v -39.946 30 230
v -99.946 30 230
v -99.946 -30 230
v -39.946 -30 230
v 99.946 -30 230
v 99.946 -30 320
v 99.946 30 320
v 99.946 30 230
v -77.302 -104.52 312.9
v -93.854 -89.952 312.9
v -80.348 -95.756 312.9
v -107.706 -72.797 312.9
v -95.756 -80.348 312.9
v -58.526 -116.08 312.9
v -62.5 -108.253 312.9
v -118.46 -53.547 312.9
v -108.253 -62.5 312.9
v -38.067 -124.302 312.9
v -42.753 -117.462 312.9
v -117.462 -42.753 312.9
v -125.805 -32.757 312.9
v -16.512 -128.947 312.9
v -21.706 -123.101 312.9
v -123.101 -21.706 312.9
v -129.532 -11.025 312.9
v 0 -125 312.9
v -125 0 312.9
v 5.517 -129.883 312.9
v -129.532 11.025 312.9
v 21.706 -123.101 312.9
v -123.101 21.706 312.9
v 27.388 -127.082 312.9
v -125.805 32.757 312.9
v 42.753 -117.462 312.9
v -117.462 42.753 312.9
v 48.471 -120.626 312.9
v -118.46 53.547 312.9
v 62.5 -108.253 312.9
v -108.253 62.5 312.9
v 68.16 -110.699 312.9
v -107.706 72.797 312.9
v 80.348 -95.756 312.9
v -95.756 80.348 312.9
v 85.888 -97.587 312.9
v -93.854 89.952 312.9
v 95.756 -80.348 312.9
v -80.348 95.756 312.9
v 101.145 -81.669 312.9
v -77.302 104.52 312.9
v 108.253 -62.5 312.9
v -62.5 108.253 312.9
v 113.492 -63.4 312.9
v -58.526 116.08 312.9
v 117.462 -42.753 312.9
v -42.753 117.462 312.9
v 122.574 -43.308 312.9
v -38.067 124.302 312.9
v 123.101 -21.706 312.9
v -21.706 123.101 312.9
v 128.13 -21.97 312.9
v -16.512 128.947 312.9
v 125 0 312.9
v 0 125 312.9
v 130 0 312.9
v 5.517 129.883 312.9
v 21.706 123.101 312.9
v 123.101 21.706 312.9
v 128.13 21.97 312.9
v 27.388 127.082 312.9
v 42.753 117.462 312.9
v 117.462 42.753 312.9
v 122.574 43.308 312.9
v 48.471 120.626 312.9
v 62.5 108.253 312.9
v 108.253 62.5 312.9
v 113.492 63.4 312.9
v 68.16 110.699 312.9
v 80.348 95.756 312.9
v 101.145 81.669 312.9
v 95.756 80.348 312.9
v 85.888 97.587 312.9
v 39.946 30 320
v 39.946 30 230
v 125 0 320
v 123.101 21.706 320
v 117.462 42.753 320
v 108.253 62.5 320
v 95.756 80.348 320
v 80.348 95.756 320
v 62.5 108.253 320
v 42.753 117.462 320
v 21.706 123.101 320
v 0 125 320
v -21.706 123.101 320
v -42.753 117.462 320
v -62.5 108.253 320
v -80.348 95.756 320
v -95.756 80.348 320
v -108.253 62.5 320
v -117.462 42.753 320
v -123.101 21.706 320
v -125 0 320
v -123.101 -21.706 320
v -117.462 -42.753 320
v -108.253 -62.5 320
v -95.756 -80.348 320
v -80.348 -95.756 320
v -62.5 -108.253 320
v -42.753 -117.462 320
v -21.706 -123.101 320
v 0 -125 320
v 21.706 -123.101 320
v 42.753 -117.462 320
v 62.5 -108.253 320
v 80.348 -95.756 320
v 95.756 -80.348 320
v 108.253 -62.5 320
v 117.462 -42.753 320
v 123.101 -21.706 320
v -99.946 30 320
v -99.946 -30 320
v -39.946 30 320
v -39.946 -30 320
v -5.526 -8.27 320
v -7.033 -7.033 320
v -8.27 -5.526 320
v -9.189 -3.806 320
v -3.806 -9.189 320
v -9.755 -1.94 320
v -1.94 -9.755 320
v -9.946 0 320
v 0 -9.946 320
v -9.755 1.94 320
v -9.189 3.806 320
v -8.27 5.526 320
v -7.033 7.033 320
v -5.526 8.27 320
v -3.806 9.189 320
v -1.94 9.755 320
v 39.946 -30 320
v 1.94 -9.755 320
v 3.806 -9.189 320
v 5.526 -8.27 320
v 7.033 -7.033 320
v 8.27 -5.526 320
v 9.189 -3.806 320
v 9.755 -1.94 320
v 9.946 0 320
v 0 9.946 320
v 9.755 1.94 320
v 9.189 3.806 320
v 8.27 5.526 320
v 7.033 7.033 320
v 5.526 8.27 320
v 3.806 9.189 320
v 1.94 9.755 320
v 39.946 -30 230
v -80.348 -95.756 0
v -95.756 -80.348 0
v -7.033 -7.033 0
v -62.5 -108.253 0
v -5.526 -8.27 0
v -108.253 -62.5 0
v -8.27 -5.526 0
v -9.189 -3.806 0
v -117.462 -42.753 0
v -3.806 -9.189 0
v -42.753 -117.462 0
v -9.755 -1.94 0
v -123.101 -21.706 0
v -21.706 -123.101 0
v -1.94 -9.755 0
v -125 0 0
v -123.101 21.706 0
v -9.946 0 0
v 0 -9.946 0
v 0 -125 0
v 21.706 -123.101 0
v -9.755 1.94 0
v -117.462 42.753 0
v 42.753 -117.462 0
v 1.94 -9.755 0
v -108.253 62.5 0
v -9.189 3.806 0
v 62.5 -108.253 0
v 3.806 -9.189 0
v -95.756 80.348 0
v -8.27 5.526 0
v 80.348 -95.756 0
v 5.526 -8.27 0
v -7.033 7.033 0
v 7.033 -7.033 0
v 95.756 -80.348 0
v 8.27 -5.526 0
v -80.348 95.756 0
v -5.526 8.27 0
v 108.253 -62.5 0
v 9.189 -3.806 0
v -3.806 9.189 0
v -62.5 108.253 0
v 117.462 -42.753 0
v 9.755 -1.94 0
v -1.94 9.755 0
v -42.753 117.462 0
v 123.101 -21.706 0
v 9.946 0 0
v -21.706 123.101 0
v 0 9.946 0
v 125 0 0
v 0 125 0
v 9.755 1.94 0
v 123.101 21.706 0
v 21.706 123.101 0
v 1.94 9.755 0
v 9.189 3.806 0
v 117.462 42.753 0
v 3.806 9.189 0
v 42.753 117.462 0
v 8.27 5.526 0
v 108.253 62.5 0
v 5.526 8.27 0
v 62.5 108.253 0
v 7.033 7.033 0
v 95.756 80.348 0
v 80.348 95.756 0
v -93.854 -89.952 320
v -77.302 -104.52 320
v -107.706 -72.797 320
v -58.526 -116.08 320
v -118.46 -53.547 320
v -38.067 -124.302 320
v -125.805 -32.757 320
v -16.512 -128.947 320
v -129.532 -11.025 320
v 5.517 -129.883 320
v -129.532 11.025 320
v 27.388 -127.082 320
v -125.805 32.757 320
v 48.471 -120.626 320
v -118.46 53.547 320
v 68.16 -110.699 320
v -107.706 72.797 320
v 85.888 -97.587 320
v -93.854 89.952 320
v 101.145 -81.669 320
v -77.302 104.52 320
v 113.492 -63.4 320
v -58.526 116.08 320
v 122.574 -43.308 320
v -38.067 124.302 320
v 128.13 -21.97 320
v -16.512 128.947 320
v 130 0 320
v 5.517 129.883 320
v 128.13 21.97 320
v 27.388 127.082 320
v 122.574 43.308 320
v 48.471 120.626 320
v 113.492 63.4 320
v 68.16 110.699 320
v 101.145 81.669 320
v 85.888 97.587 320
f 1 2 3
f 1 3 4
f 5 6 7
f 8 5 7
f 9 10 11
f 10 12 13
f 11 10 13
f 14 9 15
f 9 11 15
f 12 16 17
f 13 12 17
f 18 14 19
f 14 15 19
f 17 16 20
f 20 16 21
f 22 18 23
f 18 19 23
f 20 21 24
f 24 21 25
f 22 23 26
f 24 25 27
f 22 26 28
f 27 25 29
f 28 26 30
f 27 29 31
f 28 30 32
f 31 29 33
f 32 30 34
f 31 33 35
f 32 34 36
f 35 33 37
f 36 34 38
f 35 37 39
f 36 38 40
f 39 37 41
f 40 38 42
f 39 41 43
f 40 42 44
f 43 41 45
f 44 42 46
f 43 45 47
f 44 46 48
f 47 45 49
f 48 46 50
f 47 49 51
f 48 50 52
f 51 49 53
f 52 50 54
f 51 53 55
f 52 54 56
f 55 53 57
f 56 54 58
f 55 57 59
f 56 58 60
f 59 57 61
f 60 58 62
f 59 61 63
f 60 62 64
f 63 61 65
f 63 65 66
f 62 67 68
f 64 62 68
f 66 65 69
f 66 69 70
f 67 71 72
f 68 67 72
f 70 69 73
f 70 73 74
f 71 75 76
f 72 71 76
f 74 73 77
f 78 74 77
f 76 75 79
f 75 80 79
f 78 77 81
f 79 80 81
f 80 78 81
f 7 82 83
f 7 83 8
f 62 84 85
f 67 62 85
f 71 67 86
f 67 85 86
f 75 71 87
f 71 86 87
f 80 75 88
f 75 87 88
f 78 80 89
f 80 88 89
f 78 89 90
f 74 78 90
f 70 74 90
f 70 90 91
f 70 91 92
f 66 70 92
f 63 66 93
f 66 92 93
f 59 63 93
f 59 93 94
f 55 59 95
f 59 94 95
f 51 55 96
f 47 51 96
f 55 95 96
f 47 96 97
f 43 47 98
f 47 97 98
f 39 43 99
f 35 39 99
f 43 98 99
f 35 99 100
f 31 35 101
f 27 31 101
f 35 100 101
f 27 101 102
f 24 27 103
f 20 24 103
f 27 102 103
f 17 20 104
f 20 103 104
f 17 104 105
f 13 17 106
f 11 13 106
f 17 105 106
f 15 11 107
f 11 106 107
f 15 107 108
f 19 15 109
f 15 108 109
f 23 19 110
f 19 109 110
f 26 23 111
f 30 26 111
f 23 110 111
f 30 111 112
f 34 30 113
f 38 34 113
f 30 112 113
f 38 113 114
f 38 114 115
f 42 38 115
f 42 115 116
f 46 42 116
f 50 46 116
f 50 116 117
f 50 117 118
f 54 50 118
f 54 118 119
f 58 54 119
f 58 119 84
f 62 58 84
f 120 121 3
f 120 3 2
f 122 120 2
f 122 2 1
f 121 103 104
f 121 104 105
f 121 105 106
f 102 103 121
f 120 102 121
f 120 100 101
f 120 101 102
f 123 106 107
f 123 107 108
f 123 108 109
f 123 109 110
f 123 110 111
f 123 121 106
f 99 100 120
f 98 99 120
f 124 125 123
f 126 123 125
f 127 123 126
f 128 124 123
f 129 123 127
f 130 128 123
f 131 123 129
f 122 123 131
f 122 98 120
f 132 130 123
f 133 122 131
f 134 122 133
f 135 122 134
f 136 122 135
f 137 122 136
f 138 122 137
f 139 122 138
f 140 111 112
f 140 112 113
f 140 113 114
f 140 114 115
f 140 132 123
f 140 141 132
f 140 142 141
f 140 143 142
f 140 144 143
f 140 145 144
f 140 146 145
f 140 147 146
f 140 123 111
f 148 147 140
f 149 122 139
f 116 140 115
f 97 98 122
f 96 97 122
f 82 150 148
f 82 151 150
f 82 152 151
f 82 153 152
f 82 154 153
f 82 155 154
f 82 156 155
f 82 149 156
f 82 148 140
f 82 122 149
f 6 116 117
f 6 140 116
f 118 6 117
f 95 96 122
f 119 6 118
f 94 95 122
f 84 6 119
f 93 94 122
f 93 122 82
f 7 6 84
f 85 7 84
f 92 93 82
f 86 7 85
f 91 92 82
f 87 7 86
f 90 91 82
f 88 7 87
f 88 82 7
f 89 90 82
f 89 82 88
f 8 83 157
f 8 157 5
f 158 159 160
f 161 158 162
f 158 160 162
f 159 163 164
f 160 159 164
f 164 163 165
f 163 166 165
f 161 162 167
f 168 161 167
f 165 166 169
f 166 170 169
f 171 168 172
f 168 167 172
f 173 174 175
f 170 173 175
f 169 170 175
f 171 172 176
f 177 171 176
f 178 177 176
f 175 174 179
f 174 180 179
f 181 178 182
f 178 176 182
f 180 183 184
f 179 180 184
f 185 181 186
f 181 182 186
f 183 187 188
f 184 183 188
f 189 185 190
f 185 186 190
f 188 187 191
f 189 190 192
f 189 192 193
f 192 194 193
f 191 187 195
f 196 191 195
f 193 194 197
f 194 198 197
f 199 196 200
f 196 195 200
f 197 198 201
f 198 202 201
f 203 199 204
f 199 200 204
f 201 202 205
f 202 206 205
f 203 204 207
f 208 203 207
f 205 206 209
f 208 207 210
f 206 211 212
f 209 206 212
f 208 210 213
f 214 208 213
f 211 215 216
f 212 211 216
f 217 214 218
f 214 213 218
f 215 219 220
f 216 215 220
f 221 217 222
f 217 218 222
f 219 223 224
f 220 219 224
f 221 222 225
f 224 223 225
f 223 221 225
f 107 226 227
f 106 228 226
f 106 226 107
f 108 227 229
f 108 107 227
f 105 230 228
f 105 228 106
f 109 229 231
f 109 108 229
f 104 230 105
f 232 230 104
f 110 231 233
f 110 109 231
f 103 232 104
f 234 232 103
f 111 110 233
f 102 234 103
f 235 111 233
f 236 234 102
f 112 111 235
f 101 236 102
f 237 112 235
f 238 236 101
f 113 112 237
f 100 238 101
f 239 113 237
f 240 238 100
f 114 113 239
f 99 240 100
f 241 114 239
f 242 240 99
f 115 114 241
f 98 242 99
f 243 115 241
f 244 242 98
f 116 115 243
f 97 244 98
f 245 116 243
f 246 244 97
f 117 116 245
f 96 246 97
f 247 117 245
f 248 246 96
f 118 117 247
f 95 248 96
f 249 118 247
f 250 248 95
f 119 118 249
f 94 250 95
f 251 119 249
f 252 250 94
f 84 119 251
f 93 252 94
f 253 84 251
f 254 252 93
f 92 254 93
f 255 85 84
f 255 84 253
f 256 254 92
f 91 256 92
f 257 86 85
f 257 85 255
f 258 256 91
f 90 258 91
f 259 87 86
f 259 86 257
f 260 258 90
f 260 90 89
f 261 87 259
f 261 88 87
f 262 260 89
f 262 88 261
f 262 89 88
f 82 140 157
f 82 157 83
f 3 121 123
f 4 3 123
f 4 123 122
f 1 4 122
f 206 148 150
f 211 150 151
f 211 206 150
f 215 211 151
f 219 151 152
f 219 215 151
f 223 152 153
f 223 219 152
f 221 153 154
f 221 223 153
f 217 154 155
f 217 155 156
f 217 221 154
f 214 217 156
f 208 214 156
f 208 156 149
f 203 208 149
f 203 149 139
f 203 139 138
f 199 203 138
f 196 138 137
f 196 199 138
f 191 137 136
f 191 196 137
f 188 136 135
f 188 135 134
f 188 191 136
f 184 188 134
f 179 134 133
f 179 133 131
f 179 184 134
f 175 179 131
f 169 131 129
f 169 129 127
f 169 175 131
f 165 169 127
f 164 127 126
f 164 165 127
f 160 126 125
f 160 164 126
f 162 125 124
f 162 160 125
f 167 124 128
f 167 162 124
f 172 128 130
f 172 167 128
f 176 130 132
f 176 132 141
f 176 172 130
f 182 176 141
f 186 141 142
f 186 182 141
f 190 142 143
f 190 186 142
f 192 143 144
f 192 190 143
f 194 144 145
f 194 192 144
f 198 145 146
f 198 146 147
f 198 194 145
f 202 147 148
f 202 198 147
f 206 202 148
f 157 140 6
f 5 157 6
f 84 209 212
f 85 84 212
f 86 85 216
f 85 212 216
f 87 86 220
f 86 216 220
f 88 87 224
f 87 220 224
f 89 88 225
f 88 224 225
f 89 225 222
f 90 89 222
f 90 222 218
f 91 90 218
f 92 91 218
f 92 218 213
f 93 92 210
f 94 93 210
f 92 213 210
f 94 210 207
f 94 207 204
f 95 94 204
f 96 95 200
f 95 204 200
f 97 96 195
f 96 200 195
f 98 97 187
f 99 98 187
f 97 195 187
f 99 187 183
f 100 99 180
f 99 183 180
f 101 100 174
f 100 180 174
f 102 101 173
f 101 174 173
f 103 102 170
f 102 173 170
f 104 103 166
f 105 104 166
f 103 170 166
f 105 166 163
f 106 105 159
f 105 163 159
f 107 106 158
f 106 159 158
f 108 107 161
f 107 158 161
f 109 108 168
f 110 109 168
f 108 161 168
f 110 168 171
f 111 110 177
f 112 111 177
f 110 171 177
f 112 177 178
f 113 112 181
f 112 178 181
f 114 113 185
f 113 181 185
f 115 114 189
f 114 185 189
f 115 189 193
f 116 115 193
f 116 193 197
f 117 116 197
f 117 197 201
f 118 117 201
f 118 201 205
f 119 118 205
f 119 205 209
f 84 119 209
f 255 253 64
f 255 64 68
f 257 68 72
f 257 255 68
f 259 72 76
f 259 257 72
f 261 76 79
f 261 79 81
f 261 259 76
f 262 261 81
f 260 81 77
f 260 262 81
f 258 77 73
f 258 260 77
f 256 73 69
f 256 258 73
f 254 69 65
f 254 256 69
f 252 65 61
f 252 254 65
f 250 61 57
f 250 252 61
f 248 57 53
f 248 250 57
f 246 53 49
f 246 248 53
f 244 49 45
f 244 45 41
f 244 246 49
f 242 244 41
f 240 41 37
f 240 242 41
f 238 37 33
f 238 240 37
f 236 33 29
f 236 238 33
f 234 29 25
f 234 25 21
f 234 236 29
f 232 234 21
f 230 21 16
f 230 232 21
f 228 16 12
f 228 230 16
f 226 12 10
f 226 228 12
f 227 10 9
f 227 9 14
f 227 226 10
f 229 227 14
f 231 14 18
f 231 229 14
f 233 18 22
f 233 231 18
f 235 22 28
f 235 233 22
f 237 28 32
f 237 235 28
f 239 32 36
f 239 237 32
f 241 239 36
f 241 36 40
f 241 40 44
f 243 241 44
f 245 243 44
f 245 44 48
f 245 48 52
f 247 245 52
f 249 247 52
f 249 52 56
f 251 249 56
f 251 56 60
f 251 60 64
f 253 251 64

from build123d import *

# Parameters (mm, degrees)
F0_R     = 125
F0_R_2   = 9.94633835
F1_DEPTH = 320
F2_R     = 130
F2_R_2   = 125
F3_DEPTH = 7.1
F4_R     = 0.9227178023
F5_DEPTH = 25
F6_W     = 60
F6_H     = 60
F7_DEPTH = 90


with BuildPart() as f1:
    # F0 (on Top) → F1 (new body)
    with BuildSketch(Plane.XY):
        Circle(F0_R)
        Circle(F0_R_2, mode=Mode.SUBTRACT)
    extrude(amount=F1_DEPTH)

    # F4 (on face) → F5 (cut)
    with BuildSketch(Plane.XY.offset(320)):
        Circle(F4_R)
    extrude(amount=-F5_DEPTH, mode=Mode.SUBTRACT)

    # F6 (on face) → F7 (cut)
    with BuildSketch(Plane.XY.offset(320)):
        with Locations((-69.94633835, 0)):
            Rectangle(F6_W, F6_H)
        with Locations((69.94633835, 0)):
            Rectangle(F6_W, F6_H)
    extrude(amount=-F7_DEPTH, mode=Mode.SUBTRACT)


with BuildPart() as f3:
    # F2 (on face) → F3 (new body)
    with BuildSketch(Plane.XY.offset(320)):
        Circle(F2_R)
        Circle(F2_R_2, mode=Mode.SUBTRACT)
    extrude(amount=-F3_DEPTH)


solid = Compound([f1.part, f3.part])
